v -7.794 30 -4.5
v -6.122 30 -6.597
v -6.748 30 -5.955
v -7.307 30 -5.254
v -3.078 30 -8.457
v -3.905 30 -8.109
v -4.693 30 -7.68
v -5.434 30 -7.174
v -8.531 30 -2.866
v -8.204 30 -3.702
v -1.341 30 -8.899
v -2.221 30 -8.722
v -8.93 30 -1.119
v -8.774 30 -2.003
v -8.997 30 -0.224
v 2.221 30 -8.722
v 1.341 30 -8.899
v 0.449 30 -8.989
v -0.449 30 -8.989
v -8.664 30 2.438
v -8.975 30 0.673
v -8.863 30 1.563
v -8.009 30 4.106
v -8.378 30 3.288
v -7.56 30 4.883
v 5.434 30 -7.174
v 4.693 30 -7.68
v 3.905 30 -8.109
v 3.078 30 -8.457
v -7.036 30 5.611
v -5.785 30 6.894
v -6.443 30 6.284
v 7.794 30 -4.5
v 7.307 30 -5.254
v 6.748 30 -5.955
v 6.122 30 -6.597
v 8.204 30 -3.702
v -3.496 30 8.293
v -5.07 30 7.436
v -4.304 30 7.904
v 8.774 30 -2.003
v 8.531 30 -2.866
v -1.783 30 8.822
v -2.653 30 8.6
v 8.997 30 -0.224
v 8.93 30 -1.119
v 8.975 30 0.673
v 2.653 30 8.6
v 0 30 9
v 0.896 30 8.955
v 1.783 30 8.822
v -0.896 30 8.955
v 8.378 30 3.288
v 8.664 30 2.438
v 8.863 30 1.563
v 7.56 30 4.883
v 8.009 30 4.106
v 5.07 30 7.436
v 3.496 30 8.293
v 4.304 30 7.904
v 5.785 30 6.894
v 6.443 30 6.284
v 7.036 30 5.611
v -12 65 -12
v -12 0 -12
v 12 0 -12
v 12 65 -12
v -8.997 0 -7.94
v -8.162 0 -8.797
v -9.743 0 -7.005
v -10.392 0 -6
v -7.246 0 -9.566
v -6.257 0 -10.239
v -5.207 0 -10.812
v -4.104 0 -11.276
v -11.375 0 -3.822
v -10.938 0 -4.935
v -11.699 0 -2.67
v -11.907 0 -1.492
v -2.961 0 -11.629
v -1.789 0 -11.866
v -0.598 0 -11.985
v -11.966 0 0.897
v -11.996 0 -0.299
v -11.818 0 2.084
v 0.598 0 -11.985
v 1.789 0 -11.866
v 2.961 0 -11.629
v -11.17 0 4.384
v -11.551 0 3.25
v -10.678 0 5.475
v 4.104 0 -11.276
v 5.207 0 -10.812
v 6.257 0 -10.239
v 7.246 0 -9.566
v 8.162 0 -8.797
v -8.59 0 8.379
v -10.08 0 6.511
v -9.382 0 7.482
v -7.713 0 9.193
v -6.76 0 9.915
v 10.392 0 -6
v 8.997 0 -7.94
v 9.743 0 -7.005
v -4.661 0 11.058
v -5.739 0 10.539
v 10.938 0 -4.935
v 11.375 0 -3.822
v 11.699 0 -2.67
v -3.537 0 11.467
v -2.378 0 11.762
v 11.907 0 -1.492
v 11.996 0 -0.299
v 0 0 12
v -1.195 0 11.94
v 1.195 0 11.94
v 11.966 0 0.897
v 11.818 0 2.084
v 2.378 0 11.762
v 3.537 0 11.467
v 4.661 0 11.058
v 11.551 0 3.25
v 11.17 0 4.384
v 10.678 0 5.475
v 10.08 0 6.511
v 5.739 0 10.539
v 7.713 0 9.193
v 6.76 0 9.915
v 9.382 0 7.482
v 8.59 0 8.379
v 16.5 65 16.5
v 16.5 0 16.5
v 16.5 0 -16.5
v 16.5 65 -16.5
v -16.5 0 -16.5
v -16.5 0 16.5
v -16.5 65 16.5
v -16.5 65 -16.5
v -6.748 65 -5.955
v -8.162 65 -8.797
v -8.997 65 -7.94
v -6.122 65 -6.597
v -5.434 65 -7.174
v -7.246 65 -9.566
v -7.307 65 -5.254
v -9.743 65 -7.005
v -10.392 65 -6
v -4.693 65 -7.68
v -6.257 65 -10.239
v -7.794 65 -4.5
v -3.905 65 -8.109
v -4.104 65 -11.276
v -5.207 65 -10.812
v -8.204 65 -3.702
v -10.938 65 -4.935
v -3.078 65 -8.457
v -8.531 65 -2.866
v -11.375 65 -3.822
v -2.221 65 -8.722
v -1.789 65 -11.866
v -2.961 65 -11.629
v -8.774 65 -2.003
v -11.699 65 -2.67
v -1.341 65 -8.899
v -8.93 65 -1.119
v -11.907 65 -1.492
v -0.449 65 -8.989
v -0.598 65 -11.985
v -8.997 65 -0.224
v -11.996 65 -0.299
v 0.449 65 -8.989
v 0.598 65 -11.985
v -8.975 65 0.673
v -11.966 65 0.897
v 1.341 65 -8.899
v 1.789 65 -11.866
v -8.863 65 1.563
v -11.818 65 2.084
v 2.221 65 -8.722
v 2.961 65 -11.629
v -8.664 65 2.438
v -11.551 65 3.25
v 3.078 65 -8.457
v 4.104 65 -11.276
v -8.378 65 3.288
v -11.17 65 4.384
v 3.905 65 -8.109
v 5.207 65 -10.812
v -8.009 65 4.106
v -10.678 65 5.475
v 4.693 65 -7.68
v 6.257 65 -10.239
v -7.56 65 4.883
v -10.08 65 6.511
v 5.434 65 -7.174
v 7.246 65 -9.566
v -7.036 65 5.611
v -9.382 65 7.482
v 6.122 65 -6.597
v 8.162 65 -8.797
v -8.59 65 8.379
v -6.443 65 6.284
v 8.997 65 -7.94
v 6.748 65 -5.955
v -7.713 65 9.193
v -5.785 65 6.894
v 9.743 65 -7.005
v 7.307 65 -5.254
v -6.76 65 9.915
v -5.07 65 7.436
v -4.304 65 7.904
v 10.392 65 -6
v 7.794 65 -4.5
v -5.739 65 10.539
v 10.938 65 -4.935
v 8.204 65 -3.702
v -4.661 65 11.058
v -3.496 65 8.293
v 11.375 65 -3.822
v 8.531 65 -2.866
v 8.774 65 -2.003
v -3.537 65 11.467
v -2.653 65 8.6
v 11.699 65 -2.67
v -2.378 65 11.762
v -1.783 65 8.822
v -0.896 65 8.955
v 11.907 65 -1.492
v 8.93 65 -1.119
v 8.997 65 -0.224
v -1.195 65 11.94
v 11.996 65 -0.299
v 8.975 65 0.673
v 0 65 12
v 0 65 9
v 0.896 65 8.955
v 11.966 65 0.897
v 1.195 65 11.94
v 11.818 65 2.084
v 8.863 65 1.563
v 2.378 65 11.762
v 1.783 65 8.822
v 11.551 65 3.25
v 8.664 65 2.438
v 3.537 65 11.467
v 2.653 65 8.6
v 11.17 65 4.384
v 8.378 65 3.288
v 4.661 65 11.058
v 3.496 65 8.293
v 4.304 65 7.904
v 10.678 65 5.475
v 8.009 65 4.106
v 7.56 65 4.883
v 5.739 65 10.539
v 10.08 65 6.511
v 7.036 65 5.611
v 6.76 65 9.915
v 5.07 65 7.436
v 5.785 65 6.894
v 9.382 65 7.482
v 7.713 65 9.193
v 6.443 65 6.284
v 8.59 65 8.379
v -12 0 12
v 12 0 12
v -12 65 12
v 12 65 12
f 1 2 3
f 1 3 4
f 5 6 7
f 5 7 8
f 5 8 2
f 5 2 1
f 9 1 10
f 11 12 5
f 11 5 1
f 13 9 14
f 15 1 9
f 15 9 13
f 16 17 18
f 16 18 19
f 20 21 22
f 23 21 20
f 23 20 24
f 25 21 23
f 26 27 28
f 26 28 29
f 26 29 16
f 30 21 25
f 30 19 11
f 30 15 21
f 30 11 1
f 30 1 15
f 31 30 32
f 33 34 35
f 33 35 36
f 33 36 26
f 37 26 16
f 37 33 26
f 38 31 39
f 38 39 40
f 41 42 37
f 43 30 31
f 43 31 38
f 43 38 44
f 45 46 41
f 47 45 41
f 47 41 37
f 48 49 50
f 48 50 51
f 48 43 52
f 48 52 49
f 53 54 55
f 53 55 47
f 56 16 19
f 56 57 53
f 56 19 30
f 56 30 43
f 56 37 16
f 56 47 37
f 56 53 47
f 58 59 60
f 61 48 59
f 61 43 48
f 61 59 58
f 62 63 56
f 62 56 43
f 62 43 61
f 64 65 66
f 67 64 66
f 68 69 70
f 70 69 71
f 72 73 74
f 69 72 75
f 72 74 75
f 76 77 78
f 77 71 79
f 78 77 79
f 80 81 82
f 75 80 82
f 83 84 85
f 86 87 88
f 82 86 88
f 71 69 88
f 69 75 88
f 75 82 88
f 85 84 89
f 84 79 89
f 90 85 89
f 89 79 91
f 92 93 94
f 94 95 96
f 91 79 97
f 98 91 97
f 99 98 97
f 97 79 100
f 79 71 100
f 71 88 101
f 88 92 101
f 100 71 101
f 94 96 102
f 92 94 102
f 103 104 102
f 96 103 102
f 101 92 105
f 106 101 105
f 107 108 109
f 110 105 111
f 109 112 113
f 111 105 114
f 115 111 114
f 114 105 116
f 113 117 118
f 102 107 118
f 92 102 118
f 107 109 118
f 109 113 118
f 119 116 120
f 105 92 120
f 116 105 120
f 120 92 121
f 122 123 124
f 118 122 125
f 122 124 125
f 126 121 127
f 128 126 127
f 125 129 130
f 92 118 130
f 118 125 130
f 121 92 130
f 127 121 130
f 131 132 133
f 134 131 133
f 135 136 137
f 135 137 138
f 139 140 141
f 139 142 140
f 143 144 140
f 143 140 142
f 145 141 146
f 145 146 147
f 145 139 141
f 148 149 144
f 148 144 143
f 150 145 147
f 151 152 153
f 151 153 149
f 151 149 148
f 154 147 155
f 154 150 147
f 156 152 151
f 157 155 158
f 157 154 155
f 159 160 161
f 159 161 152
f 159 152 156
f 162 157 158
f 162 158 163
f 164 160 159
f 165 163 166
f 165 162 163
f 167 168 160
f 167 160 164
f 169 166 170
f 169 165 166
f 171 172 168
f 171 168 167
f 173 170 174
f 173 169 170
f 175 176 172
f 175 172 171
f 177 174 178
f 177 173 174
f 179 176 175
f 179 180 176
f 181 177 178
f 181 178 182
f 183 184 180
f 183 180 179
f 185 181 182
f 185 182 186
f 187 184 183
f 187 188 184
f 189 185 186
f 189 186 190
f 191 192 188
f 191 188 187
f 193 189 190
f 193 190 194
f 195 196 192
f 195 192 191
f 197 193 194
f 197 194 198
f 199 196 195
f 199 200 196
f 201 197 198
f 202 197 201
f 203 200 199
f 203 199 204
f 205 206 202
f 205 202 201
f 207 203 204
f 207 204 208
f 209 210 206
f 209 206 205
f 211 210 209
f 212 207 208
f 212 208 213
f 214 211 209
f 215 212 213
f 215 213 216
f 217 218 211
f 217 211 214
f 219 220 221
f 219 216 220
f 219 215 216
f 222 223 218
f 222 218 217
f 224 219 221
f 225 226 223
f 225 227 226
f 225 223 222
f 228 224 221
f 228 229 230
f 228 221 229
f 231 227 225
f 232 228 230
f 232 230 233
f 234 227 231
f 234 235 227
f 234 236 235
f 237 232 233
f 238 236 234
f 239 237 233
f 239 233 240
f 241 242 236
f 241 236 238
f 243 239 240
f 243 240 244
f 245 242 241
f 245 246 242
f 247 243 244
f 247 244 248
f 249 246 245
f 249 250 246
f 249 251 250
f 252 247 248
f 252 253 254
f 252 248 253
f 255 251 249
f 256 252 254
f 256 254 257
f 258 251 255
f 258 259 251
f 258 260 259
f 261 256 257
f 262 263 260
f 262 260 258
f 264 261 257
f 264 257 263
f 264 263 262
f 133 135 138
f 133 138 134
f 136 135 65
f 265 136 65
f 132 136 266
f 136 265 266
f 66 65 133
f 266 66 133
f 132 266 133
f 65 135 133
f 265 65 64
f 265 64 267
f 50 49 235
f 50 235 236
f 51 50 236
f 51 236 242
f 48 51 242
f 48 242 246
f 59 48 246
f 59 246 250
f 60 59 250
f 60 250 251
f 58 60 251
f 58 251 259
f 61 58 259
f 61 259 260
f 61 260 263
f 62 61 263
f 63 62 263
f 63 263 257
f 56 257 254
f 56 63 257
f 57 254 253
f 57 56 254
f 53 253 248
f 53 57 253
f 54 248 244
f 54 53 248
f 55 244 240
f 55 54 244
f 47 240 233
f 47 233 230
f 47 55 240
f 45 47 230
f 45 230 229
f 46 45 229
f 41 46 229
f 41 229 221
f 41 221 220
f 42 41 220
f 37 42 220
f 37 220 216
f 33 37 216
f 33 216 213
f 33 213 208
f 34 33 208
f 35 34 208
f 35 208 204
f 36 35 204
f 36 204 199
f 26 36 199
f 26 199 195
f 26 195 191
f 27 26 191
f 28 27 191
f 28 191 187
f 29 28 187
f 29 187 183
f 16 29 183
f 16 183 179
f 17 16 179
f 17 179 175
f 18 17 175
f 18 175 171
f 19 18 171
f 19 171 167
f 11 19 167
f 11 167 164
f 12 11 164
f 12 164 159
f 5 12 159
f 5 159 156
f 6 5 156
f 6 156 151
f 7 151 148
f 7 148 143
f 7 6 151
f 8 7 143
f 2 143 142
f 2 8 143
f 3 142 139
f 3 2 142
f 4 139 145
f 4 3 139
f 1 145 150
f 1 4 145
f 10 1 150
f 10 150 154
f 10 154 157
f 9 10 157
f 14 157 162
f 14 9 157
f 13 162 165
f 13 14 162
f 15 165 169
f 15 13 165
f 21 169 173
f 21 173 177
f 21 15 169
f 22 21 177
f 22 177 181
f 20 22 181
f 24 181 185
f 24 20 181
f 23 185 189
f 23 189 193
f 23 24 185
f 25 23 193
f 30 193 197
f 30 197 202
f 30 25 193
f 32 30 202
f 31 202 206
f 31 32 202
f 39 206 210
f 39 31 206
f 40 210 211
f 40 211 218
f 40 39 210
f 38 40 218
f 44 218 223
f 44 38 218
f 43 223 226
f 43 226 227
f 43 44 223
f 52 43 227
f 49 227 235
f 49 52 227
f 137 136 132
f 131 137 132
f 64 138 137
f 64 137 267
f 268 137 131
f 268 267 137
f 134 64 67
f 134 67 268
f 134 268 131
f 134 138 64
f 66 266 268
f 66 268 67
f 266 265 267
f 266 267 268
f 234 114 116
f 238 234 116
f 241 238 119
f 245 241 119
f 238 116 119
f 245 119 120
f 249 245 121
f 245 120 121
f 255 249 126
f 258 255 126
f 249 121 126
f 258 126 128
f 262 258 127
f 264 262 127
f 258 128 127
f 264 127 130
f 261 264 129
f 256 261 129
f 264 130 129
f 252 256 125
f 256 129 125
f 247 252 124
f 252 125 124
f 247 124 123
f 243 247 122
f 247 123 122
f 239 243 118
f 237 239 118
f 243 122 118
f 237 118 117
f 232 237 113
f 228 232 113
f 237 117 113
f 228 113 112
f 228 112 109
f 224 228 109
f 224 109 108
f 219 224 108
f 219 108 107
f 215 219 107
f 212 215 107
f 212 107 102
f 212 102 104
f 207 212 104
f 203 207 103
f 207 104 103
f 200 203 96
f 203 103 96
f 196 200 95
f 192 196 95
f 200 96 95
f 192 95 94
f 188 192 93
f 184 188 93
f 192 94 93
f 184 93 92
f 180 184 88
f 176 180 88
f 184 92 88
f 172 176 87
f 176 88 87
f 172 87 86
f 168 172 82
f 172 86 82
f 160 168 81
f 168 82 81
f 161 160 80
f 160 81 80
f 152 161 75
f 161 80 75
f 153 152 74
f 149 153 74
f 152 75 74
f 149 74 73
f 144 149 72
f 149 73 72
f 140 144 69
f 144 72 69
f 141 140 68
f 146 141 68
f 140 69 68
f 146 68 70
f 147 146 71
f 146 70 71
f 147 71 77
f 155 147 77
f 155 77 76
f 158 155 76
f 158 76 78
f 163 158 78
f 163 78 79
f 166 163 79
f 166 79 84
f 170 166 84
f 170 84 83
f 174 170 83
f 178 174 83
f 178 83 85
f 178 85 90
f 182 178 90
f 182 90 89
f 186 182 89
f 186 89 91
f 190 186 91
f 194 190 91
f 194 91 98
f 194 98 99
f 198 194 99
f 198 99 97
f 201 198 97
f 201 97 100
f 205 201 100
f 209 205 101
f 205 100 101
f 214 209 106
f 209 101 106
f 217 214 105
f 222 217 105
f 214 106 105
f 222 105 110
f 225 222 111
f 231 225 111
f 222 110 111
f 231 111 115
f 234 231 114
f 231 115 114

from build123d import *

# Parameters (mm, degrees)
SKETCH_1_R        = 9
EXTRUDE_1_DEPTH   = 65
SKETCH_1_W        = 33
SKETCH_1_H        = 33
EXTRUDE_1_2_DEPTH = 65
SKETCH_1_3_R      = 9
EXTRUDE_2_DEPTH   = 30


with BuildPart() as part:
    # 草图1 → 凸台-拉伸1 (new body)
    with BuildSketch(Plane(origin=(0, 0, 0), x_dir=(1, 0, 0), z_dir=(0, 1, 0))):
        with BuildLine():
            ThreePointArc((12, 0), (8.485281374, 8.485281374), (0, 12))
            ThreePointArc((0, 12), (-8.485281374, 8.485281374), (-12, 0))
            ThreePointArc((-12, 0), (-8.485281374, -8.485281374), (0, -12))
            ThreePointArc((0, -12), (8.485281374, -8.485281374), (12, 0))
        make_face()
        Circle(SKETCH_1_R, mode=Mode.SUBTRACT)
    extrude(amount=EXTRUDE_1_DEPTH)

    # 草图1<3> → 凸台-拉伸2 (add)
    with BuildSketch(Plane(origin=(0, 0, 0), x_dir=(1, 0, 0), z_dir=(0, 1, 0))):
        Circle(SKETCH_1_3_R)
    extrude(amount=EXTRUDE_2_DEPTH)


with BuildPart() as body_2:
    # 草图1 → Extrude 1 2 (new body)
    with BuildSketch(Plane(origin=(0, 0, 0), x_dir=(1, 0, 0), z_dir=(0, 1, 0))):
        Rectangle(SKETCH_1_W, SKETCH_1_H)
        Polygon((-12, 12), (0, 12), (12, 12), (12, 0), (12, -12), (0, -12), (-12, -12), (-12, 0), align=None, mode=Mode.SUBTRACT)
    extrude(amount=EXTRUDE_1_2_DEPTH)


solid = Compound([part.part, body_2.part])
